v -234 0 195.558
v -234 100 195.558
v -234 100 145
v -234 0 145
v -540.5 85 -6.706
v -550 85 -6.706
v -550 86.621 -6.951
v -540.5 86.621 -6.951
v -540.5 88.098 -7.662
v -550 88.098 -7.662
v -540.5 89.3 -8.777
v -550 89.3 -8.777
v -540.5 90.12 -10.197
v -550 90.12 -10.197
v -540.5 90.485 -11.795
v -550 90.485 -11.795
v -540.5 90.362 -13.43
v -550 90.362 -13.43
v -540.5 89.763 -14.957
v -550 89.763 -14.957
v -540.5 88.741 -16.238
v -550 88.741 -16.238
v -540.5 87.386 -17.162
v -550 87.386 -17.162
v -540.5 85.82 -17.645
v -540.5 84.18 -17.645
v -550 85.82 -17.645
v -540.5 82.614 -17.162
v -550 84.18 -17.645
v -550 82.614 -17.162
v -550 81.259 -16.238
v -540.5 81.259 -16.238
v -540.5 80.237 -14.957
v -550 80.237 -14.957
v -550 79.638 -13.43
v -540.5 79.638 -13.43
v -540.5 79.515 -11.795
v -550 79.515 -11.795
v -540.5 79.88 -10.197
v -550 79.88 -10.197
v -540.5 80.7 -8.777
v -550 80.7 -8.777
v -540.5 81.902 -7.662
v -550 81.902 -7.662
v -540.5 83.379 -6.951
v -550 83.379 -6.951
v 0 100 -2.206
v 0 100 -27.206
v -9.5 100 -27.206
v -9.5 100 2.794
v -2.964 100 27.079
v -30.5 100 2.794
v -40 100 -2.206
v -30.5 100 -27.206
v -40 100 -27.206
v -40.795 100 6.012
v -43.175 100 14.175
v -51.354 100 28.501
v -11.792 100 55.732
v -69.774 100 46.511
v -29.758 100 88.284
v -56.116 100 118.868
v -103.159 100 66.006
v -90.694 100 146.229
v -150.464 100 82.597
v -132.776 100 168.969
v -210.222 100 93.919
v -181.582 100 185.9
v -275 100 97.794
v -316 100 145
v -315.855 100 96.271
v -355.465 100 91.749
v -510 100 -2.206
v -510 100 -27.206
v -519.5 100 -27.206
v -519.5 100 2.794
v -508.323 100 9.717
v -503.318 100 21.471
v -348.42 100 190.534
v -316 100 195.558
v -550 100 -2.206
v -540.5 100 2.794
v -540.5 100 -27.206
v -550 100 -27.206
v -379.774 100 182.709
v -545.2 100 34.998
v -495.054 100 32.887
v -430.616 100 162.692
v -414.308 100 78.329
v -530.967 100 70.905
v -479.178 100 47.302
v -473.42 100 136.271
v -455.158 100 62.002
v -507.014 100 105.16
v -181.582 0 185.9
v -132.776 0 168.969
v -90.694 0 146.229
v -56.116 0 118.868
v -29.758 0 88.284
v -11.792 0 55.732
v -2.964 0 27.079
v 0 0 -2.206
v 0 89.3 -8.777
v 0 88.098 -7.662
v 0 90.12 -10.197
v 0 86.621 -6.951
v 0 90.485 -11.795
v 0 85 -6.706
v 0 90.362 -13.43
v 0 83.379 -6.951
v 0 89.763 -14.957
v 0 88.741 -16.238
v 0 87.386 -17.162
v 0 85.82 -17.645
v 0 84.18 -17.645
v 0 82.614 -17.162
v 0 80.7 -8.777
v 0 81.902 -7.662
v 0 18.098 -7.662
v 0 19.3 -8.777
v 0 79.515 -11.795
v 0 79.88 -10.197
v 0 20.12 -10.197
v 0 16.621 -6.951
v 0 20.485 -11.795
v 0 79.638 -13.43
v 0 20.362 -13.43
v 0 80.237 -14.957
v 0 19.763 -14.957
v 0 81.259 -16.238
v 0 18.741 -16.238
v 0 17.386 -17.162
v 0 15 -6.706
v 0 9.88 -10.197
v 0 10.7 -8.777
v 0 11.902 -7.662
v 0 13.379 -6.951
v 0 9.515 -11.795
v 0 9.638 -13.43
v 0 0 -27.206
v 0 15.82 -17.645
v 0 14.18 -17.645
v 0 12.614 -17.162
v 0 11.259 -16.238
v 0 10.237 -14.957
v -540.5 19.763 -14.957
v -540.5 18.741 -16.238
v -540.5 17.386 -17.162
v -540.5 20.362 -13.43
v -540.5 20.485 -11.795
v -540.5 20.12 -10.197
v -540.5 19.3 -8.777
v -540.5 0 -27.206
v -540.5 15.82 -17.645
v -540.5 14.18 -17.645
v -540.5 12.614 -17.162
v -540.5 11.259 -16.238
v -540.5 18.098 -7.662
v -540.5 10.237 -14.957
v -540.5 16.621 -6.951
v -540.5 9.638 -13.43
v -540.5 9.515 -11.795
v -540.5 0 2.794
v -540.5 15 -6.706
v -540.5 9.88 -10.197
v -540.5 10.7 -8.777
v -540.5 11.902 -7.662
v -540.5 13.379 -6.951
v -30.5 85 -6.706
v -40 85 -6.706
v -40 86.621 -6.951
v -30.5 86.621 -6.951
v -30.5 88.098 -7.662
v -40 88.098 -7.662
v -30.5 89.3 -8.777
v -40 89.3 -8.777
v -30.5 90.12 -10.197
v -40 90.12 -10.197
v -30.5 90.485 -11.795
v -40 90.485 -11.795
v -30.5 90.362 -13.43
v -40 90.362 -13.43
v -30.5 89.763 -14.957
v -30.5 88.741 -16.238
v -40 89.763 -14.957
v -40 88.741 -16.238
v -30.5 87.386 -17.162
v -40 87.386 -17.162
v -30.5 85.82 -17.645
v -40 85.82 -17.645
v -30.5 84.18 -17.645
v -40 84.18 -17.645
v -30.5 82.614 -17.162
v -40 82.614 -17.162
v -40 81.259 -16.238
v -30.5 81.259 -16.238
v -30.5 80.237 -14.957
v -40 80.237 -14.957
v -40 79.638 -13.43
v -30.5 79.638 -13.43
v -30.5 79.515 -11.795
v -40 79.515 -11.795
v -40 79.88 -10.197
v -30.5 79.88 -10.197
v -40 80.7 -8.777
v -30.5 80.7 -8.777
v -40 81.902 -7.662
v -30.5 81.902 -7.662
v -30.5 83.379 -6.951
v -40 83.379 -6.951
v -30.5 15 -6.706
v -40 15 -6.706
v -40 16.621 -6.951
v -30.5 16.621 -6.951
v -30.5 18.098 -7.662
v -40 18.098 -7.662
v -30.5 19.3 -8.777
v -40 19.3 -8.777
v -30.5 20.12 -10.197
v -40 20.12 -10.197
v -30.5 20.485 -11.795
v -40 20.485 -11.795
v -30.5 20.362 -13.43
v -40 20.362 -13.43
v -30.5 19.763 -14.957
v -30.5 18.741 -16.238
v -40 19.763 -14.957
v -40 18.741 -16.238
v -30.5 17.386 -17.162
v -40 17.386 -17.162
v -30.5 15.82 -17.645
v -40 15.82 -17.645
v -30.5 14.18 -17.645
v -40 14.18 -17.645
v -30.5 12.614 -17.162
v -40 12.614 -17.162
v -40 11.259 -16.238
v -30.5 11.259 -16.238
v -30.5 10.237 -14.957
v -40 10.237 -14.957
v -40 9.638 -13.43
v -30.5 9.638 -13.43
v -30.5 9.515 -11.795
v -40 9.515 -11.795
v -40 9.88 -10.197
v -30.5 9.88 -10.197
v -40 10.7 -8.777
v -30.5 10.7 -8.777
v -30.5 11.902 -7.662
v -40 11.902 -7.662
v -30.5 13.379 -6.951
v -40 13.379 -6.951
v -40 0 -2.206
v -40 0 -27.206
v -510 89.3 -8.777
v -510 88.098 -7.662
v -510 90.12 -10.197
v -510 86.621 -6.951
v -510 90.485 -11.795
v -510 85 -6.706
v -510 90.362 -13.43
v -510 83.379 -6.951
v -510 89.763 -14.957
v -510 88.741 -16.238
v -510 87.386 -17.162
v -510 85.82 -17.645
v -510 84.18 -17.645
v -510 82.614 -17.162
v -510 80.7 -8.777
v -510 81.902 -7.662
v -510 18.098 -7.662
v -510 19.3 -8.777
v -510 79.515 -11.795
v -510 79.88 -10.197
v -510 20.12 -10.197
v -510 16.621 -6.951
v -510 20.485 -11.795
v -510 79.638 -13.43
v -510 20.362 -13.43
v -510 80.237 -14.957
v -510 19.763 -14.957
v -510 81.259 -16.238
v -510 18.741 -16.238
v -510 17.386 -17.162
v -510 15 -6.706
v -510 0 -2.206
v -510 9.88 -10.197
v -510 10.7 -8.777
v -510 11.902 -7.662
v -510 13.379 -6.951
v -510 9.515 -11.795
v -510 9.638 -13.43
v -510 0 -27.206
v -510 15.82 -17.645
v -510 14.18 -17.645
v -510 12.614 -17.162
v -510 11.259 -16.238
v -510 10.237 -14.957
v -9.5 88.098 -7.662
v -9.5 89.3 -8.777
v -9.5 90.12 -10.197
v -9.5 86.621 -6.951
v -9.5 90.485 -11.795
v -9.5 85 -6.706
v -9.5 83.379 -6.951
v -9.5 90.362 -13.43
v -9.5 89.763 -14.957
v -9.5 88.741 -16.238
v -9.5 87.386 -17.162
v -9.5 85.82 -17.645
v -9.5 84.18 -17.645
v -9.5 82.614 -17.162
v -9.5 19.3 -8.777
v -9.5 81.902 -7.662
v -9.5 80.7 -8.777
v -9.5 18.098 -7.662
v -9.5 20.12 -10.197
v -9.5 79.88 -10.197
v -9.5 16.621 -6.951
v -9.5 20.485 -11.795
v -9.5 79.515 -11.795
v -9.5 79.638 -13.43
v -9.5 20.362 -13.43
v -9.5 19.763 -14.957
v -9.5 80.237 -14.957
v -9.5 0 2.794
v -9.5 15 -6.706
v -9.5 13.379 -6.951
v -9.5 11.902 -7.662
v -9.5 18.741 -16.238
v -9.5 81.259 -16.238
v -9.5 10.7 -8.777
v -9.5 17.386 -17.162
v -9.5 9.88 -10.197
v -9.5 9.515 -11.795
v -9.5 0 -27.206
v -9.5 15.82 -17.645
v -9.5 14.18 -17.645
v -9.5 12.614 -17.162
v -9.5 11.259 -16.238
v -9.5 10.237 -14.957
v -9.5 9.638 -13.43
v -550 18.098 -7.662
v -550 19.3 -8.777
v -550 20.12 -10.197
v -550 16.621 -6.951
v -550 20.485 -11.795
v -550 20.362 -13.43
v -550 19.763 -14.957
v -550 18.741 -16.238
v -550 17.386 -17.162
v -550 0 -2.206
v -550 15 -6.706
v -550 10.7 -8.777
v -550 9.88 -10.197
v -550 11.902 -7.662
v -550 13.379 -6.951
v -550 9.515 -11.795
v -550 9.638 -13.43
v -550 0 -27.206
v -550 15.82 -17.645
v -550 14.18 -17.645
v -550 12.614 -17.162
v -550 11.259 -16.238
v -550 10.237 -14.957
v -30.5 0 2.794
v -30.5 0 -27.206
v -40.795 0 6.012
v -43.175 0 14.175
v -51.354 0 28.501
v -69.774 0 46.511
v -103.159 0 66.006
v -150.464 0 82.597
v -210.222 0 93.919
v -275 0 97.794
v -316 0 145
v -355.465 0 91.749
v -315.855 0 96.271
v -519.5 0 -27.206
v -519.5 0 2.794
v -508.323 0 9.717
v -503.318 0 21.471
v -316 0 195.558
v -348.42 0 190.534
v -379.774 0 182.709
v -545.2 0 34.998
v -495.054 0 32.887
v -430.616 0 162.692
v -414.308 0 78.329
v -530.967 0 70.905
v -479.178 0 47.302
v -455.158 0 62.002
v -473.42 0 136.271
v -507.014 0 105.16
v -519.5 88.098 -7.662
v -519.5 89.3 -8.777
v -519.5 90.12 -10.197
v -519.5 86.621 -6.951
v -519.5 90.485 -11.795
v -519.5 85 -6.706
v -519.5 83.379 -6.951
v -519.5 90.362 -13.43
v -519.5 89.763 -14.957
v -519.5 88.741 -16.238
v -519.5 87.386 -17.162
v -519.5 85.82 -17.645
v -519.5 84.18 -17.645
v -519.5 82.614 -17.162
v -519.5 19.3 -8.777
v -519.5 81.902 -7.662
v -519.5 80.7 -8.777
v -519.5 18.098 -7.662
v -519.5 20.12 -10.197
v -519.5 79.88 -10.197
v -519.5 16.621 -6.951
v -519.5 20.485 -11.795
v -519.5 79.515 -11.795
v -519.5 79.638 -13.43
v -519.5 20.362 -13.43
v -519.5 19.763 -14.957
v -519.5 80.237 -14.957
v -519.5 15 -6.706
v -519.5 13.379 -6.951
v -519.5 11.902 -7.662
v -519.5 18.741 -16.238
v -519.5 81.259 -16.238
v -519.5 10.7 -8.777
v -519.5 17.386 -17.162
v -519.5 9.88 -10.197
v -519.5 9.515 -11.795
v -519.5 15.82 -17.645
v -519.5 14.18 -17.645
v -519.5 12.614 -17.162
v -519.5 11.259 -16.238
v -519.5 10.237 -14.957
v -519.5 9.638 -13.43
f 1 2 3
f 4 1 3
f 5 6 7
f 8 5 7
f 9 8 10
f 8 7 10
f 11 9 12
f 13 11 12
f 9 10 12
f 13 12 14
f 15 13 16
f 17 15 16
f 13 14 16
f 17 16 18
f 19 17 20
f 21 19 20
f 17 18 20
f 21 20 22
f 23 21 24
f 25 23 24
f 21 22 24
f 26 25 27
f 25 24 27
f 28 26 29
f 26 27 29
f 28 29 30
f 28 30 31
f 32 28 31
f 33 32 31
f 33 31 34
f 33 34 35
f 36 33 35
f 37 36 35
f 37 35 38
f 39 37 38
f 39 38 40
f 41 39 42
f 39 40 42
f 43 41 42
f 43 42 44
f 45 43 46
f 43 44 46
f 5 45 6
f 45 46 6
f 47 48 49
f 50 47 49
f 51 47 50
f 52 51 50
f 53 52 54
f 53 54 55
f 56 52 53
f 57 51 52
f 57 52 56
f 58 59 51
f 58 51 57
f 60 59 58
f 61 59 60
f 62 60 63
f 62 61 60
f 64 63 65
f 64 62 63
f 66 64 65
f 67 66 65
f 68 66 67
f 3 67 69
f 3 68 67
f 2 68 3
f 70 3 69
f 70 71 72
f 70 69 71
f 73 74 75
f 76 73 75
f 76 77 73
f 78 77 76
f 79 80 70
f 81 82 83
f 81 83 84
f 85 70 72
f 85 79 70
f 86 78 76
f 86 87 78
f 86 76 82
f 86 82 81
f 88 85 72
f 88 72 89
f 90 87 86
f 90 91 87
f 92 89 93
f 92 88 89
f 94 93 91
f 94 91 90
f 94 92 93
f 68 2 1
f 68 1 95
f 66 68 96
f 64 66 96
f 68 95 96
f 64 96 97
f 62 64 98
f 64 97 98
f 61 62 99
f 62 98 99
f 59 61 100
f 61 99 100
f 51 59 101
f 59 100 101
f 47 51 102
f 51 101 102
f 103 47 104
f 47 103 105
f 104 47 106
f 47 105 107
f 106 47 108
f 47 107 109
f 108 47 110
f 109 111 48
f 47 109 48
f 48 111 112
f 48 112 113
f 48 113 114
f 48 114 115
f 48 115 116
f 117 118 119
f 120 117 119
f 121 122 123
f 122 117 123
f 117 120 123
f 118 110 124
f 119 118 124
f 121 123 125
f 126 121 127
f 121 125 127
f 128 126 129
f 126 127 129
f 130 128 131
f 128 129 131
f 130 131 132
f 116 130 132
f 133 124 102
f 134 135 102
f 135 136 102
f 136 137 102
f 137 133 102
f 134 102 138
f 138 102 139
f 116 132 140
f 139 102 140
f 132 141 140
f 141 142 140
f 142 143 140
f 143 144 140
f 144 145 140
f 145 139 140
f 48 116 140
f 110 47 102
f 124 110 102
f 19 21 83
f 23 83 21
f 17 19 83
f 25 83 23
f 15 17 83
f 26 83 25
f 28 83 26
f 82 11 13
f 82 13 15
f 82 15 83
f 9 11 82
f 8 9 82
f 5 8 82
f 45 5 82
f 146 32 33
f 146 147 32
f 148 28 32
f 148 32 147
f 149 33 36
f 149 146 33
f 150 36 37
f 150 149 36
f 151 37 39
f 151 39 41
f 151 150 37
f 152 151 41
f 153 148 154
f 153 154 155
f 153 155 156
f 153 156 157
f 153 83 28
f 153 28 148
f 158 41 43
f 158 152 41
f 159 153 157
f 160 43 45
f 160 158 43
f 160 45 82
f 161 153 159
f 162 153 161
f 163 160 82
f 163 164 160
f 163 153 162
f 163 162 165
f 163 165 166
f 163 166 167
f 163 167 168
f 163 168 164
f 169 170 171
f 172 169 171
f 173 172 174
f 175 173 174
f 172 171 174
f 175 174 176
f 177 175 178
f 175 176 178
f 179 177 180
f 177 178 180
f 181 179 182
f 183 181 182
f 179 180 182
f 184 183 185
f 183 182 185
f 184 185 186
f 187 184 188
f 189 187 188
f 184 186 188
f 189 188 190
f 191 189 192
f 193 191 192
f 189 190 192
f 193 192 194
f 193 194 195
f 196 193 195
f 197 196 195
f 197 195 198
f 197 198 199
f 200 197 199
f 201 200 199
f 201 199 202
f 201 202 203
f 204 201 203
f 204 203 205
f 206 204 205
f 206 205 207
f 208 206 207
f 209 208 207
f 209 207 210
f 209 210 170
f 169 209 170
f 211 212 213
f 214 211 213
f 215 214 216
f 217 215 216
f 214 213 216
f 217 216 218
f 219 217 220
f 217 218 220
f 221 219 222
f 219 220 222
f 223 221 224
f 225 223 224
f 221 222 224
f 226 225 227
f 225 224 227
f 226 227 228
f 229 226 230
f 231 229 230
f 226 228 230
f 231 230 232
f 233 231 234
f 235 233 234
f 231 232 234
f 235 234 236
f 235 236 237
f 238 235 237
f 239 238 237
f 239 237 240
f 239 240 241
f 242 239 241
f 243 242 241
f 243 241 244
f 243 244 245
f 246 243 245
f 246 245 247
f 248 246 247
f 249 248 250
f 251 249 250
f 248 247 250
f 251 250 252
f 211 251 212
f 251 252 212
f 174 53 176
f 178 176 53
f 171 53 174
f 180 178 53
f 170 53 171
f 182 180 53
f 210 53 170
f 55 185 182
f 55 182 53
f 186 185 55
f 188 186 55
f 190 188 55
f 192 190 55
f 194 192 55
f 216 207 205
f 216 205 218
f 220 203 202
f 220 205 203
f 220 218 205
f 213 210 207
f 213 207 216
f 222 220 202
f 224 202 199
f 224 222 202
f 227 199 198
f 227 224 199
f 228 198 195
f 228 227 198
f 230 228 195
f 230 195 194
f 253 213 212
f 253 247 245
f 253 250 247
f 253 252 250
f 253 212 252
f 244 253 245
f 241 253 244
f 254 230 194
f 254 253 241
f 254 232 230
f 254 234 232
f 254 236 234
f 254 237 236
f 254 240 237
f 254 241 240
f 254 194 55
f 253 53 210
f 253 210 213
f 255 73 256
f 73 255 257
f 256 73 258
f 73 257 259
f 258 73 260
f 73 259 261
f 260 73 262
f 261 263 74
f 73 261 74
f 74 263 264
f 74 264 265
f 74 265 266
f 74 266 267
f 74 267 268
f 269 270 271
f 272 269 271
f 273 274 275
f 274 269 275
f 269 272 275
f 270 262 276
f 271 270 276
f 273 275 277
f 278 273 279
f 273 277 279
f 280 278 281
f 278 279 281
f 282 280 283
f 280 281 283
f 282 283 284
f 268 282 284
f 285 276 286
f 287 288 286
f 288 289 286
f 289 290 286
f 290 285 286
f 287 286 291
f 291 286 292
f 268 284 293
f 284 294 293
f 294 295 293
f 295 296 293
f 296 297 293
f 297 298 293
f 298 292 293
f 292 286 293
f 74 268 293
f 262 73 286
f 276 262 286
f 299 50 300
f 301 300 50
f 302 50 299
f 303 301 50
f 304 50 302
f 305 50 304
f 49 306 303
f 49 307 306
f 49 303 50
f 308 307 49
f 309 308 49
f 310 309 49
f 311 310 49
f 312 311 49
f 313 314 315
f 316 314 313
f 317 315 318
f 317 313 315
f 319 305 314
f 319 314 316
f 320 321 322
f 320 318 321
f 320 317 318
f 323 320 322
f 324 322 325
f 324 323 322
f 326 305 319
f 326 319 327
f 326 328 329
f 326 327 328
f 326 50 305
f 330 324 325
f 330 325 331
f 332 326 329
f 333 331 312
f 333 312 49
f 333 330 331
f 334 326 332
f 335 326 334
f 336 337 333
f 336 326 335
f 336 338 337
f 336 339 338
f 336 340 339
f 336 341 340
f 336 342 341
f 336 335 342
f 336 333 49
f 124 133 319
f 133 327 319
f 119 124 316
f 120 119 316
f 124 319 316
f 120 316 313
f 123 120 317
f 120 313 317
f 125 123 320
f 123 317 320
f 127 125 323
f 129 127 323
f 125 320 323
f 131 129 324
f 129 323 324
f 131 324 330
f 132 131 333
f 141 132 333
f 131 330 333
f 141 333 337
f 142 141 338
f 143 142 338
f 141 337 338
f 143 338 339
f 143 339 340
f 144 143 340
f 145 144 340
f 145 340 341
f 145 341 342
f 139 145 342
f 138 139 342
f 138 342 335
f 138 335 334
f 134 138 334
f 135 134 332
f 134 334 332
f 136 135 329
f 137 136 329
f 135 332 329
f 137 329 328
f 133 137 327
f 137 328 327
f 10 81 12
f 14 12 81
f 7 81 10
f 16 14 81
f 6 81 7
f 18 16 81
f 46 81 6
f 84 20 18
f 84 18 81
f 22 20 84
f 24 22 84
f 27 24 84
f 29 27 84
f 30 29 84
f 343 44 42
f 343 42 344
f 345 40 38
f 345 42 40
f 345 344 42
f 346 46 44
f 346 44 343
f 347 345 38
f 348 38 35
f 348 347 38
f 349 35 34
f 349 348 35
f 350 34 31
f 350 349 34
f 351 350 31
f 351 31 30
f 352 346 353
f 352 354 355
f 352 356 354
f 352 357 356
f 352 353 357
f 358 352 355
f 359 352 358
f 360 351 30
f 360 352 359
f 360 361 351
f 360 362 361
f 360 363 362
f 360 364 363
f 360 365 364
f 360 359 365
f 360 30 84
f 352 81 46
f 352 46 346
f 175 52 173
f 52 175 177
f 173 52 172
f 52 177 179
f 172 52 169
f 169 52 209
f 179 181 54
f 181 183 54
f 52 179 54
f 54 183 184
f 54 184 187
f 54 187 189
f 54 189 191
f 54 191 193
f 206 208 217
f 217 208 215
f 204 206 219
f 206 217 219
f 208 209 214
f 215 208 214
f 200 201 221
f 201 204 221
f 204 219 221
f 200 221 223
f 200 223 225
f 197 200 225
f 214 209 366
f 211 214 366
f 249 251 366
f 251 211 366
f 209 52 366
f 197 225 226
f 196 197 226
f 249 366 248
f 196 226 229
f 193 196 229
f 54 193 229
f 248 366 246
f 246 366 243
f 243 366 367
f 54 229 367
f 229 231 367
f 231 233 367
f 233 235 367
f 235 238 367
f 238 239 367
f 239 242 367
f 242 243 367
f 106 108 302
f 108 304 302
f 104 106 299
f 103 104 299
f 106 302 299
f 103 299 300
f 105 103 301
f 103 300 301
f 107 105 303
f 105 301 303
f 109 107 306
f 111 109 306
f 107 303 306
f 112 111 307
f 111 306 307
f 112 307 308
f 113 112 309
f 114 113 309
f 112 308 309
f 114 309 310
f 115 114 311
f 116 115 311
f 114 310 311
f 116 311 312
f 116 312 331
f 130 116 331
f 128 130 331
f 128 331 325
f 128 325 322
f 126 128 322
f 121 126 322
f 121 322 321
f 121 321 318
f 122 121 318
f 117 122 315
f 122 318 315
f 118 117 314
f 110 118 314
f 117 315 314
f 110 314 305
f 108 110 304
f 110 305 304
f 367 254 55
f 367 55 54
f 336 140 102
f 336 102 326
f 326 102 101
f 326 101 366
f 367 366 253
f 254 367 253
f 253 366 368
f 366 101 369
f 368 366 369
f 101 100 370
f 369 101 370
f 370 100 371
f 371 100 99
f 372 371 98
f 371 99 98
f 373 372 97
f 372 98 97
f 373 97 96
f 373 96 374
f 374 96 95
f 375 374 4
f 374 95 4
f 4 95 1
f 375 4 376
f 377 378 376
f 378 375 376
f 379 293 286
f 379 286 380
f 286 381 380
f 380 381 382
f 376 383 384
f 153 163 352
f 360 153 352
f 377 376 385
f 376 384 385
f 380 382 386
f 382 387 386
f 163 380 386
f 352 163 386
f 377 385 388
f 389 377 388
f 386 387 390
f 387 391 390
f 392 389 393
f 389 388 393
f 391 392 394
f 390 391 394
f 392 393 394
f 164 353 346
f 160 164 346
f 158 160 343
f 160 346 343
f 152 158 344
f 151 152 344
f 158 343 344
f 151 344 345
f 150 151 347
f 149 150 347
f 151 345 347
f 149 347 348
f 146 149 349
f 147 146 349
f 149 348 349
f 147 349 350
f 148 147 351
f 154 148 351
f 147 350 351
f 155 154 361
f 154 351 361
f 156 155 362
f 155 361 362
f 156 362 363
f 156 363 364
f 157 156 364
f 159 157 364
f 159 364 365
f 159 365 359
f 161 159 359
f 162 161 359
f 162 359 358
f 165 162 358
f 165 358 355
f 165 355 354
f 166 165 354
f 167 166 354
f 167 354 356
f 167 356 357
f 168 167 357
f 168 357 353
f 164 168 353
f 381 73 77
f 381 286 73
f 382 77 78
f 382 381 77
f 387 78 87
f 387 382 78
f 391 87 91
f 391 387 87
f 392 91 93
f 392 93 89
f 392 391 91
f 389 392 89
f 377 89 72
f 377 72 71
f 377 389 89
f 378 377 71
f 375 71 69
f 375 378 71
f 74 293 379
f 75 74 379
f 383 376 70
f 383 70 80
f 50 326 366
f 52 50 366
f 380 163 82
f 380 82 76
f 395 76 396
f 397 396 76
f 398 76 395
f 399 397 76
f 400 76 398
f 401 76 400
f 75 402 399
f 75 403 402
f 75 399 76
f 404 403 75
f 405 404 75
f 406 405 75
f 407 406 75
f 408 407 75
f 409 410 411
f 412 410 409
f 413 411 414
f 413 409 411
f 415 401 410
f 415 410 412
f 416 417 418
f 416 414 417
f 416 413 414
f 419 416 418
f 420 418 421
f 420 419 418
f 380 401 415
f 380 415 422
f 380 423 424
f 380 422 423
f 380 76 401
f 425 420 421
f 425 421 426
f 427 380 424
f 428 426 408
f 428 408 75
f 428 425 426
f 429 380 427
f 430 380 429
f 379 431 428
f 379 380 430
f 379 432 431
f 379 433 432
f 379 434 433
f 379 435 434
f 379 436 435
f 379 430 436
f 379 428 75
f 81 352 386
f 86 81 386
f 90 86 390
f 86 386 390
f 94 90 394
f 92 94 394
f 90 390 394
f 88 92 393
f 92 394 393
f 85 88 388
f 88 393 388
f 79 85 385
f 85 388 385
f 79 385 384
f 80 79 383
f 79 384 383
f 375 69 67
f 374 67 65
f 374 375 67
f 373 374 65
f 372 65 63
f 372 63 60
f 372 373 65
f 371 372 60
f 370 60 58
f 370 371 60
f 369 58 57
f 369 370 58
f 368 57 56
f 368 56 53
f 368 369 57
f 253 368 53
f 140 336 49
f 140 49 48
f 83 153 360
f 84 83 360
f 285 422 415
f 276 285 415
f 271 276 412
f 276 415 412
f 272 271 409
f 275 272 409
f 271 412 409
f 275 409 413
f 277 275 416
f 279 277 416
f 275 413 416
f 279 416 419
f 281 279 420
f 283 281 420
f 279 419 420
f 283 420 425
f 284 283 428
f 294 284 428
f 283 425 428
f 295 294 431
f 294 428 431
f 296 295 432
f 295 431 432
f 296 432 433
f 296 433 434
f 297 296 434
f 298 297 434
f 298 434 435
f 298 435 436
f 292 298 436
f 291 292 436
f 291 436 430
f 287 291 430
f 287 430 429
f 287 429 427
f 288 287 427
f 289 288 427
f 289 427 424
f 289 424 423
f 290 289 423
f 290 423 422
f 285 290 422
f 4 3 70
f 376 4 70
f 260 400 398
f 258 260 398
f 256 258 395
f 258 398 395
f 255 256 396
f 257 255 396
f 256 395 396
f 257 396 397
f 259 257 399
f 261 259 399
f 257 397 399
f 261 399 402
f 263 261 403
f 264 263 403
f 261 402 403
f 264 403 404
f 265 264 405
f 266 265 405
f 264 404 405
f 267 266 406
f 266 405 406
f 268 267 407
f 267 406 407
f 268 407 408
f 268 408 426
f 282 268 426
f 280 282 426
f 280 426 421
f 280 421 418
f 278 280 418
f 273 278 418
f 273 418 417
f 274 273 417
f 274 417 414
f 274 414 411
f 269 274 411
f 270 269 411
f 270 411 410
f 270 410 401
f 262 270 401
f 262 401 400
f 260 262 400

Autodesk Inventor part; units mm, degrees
ref_plane "YZ Plane" through (0, 0, 0) normal (1, 0, 0) x (0, 1, 0)
ref_plane "XZ Plane" through (0, 0, 0) normal (0, 1, 0) x (-1, 0, 0)
ref_plane "XY Plane" through (0, 0, 0) normal (0, 0, 1) x (1, 0, 0)
sketch "Sketch1" plane through (0, 0, 0) normal (0, 1, 0) x (-1, 0, 0)
  line L0 (0, 20.9385) -> (0, -224.0391)
  ellipse E0 centre (275, -2.2065) end of major axis (0, -2.2065) minor radius 200 (275, 197.7935) -> (0, -2.2065) ccw
  ellipse E1 centre (275, -2.2065) end of major axis (40, -2.2065) minor radius 100 (275, 97.7935) -> (40, -2.2065) ccw
  line L1 (0, -2.2065) -> (40, -2.2065)
  line L2 (30.5, -2.2065) -> (9.5, -2.2065)
  line L3 (9.5, -2.2065) -> (9.5, 2.7935)
  line L4 (9.5, 2.7935) -> (30.5, 2.7935)
  line L5 (30.5, 2.7935) -> (30.5, -2.2065)
  line L6 (0, -2.2065) -> (9.5, -2.2065)
  line L7 (9.5, -2.2065) -> (9.5, -27.2065)
  line L8 (9.5, -27.2065) -> (0, -27.2065)
  line L9 (0, -27.2065) -> (0, -2.2065)
  line L10 (30.5, -2.2065) -> (40, -2.2065)
  line L11 (40, -2.2065) -> (40, -27.2065)
  line L12 (40, -27.2065) -> (30.5, -27.2065)
  line L13 (30.5, -27.2065) -> (30.5, -2.2065)
  line L14 (275, -2.2065) -> (275, 197.7935)
  line L15 (550, 20.9385) -> (550, -224.0391)
  ellipse E2 centre (275, -2.2065) end of major axis (550, -2.2065) minor radius 200 (550, -2.2065) -> (275, 197.7935) ccw
  ellipse E3 centre (275, -2.2065) end of major axis (510, -2.2065) minor radius 100 (510, -2.2065) -> (275, 97.7935) ccw
  line L16 (550, -2.2065) -> (510, -2.2065)
  line L17 (519.5, -2.2065) -> (540.5, -2.2065)
  line L18 (540.5, -2.2065) -> (540.5, 2.7935)
  line L19 (540.5, 2.7935) -> (519.5, 2.7935)
  line L20 (519.5, 2.7935) -> (519.5, -2.2065)
  line L21 (550, -2.2065) -> (540.5, -2.2065)
  line L22 (540.5, -2.2065) -> (540.5, -27.2065)
  line L23 (540.5, -27.2065) -> (550, -27.2065)
  line L24 (550, -27.2065) -> (550, -2.2065)
  line L25 (519.5, -2.2065) -> (510, -2.2065)
  line L26 (510, -2.2065) -> (510, -27.2065)
  line L27 (510, -27.2065) -> (519.5, -27.2065)
  line L28 (519.5, -27.2065) -> (519.5, -2.2065)
  point P0 (40, -2.2065)
  point P1 (0, -27.2065)
  dimension "d7" = 275
  dimension "d8" = 235
  dimension "d9" = 100
  dimension "d10" = 200
  dimension "d13" = 21
  dimension "d14" = 9.5
  dimension "d15" = 5
  dimension "d16" = 9.5
  dimension "d17" = 9.5
  dimension "d18" = 25
  dimension "d19" = 25
  dimension "d20" = 30
extrude "Extrusion1" add sketch "Sketch1" along normal blind 100 contours L1 L7 L8 L0 | E0 L14 E1 L1 L5 L4 L3 | E2 L16 L18 L19 L20 E3 L14 | L15 L23 L22 L16 | L1 L11 L12 L13 | L16 L28 L27 L26
sketch "Sketch2" plane through (0, 100, 0) normal (0, 1, 0) x (1, 0, 0)
  line L0 (-234, -145) -> (-316, -145)
  line L1 (-316, -145) -> (-316, -247)
  line L2 (-316, -247) -> (-234, -247)
  line L3 (-234, -247) -> (-234, -145)
  point P0 (0, 0)
  point P1 (-275, -145)
  dimension "d21" = 102
  dimension "d22" = 82
  dimension "d23" = 234
  dimension "d24" = 145
extrude "Extrusion2" cut sketch "Sketch2" against normal blind 300
sketch "Sketch3" plane through (-550, 0, -27.2065) normal (-1, 0, 0) x (0, 0, 1)
  circle A0 centre (15, 15) radius 5.5
  circle A1 centre (15, 85) radius 5.5
  line L0 (0, 0) -> (0, 100) projected
  line L1 (0, 0) -> (25, 0) projected
  line L2 (0, 100) -> (25, 100) projected
  point P0 (27.2065, 0)
  dimension "d27" = 11
  dimension "d28" = 11
  dimension "d29" = 15
  dimension "d30" = 15
  dimension "d31" = 15
  dimension "d32" = 15
extrude "Extrusion3" cut sketch "Sketch3" against normal blind 700
properties part number "CurvedSeatHolder" material "PET Plastic"
